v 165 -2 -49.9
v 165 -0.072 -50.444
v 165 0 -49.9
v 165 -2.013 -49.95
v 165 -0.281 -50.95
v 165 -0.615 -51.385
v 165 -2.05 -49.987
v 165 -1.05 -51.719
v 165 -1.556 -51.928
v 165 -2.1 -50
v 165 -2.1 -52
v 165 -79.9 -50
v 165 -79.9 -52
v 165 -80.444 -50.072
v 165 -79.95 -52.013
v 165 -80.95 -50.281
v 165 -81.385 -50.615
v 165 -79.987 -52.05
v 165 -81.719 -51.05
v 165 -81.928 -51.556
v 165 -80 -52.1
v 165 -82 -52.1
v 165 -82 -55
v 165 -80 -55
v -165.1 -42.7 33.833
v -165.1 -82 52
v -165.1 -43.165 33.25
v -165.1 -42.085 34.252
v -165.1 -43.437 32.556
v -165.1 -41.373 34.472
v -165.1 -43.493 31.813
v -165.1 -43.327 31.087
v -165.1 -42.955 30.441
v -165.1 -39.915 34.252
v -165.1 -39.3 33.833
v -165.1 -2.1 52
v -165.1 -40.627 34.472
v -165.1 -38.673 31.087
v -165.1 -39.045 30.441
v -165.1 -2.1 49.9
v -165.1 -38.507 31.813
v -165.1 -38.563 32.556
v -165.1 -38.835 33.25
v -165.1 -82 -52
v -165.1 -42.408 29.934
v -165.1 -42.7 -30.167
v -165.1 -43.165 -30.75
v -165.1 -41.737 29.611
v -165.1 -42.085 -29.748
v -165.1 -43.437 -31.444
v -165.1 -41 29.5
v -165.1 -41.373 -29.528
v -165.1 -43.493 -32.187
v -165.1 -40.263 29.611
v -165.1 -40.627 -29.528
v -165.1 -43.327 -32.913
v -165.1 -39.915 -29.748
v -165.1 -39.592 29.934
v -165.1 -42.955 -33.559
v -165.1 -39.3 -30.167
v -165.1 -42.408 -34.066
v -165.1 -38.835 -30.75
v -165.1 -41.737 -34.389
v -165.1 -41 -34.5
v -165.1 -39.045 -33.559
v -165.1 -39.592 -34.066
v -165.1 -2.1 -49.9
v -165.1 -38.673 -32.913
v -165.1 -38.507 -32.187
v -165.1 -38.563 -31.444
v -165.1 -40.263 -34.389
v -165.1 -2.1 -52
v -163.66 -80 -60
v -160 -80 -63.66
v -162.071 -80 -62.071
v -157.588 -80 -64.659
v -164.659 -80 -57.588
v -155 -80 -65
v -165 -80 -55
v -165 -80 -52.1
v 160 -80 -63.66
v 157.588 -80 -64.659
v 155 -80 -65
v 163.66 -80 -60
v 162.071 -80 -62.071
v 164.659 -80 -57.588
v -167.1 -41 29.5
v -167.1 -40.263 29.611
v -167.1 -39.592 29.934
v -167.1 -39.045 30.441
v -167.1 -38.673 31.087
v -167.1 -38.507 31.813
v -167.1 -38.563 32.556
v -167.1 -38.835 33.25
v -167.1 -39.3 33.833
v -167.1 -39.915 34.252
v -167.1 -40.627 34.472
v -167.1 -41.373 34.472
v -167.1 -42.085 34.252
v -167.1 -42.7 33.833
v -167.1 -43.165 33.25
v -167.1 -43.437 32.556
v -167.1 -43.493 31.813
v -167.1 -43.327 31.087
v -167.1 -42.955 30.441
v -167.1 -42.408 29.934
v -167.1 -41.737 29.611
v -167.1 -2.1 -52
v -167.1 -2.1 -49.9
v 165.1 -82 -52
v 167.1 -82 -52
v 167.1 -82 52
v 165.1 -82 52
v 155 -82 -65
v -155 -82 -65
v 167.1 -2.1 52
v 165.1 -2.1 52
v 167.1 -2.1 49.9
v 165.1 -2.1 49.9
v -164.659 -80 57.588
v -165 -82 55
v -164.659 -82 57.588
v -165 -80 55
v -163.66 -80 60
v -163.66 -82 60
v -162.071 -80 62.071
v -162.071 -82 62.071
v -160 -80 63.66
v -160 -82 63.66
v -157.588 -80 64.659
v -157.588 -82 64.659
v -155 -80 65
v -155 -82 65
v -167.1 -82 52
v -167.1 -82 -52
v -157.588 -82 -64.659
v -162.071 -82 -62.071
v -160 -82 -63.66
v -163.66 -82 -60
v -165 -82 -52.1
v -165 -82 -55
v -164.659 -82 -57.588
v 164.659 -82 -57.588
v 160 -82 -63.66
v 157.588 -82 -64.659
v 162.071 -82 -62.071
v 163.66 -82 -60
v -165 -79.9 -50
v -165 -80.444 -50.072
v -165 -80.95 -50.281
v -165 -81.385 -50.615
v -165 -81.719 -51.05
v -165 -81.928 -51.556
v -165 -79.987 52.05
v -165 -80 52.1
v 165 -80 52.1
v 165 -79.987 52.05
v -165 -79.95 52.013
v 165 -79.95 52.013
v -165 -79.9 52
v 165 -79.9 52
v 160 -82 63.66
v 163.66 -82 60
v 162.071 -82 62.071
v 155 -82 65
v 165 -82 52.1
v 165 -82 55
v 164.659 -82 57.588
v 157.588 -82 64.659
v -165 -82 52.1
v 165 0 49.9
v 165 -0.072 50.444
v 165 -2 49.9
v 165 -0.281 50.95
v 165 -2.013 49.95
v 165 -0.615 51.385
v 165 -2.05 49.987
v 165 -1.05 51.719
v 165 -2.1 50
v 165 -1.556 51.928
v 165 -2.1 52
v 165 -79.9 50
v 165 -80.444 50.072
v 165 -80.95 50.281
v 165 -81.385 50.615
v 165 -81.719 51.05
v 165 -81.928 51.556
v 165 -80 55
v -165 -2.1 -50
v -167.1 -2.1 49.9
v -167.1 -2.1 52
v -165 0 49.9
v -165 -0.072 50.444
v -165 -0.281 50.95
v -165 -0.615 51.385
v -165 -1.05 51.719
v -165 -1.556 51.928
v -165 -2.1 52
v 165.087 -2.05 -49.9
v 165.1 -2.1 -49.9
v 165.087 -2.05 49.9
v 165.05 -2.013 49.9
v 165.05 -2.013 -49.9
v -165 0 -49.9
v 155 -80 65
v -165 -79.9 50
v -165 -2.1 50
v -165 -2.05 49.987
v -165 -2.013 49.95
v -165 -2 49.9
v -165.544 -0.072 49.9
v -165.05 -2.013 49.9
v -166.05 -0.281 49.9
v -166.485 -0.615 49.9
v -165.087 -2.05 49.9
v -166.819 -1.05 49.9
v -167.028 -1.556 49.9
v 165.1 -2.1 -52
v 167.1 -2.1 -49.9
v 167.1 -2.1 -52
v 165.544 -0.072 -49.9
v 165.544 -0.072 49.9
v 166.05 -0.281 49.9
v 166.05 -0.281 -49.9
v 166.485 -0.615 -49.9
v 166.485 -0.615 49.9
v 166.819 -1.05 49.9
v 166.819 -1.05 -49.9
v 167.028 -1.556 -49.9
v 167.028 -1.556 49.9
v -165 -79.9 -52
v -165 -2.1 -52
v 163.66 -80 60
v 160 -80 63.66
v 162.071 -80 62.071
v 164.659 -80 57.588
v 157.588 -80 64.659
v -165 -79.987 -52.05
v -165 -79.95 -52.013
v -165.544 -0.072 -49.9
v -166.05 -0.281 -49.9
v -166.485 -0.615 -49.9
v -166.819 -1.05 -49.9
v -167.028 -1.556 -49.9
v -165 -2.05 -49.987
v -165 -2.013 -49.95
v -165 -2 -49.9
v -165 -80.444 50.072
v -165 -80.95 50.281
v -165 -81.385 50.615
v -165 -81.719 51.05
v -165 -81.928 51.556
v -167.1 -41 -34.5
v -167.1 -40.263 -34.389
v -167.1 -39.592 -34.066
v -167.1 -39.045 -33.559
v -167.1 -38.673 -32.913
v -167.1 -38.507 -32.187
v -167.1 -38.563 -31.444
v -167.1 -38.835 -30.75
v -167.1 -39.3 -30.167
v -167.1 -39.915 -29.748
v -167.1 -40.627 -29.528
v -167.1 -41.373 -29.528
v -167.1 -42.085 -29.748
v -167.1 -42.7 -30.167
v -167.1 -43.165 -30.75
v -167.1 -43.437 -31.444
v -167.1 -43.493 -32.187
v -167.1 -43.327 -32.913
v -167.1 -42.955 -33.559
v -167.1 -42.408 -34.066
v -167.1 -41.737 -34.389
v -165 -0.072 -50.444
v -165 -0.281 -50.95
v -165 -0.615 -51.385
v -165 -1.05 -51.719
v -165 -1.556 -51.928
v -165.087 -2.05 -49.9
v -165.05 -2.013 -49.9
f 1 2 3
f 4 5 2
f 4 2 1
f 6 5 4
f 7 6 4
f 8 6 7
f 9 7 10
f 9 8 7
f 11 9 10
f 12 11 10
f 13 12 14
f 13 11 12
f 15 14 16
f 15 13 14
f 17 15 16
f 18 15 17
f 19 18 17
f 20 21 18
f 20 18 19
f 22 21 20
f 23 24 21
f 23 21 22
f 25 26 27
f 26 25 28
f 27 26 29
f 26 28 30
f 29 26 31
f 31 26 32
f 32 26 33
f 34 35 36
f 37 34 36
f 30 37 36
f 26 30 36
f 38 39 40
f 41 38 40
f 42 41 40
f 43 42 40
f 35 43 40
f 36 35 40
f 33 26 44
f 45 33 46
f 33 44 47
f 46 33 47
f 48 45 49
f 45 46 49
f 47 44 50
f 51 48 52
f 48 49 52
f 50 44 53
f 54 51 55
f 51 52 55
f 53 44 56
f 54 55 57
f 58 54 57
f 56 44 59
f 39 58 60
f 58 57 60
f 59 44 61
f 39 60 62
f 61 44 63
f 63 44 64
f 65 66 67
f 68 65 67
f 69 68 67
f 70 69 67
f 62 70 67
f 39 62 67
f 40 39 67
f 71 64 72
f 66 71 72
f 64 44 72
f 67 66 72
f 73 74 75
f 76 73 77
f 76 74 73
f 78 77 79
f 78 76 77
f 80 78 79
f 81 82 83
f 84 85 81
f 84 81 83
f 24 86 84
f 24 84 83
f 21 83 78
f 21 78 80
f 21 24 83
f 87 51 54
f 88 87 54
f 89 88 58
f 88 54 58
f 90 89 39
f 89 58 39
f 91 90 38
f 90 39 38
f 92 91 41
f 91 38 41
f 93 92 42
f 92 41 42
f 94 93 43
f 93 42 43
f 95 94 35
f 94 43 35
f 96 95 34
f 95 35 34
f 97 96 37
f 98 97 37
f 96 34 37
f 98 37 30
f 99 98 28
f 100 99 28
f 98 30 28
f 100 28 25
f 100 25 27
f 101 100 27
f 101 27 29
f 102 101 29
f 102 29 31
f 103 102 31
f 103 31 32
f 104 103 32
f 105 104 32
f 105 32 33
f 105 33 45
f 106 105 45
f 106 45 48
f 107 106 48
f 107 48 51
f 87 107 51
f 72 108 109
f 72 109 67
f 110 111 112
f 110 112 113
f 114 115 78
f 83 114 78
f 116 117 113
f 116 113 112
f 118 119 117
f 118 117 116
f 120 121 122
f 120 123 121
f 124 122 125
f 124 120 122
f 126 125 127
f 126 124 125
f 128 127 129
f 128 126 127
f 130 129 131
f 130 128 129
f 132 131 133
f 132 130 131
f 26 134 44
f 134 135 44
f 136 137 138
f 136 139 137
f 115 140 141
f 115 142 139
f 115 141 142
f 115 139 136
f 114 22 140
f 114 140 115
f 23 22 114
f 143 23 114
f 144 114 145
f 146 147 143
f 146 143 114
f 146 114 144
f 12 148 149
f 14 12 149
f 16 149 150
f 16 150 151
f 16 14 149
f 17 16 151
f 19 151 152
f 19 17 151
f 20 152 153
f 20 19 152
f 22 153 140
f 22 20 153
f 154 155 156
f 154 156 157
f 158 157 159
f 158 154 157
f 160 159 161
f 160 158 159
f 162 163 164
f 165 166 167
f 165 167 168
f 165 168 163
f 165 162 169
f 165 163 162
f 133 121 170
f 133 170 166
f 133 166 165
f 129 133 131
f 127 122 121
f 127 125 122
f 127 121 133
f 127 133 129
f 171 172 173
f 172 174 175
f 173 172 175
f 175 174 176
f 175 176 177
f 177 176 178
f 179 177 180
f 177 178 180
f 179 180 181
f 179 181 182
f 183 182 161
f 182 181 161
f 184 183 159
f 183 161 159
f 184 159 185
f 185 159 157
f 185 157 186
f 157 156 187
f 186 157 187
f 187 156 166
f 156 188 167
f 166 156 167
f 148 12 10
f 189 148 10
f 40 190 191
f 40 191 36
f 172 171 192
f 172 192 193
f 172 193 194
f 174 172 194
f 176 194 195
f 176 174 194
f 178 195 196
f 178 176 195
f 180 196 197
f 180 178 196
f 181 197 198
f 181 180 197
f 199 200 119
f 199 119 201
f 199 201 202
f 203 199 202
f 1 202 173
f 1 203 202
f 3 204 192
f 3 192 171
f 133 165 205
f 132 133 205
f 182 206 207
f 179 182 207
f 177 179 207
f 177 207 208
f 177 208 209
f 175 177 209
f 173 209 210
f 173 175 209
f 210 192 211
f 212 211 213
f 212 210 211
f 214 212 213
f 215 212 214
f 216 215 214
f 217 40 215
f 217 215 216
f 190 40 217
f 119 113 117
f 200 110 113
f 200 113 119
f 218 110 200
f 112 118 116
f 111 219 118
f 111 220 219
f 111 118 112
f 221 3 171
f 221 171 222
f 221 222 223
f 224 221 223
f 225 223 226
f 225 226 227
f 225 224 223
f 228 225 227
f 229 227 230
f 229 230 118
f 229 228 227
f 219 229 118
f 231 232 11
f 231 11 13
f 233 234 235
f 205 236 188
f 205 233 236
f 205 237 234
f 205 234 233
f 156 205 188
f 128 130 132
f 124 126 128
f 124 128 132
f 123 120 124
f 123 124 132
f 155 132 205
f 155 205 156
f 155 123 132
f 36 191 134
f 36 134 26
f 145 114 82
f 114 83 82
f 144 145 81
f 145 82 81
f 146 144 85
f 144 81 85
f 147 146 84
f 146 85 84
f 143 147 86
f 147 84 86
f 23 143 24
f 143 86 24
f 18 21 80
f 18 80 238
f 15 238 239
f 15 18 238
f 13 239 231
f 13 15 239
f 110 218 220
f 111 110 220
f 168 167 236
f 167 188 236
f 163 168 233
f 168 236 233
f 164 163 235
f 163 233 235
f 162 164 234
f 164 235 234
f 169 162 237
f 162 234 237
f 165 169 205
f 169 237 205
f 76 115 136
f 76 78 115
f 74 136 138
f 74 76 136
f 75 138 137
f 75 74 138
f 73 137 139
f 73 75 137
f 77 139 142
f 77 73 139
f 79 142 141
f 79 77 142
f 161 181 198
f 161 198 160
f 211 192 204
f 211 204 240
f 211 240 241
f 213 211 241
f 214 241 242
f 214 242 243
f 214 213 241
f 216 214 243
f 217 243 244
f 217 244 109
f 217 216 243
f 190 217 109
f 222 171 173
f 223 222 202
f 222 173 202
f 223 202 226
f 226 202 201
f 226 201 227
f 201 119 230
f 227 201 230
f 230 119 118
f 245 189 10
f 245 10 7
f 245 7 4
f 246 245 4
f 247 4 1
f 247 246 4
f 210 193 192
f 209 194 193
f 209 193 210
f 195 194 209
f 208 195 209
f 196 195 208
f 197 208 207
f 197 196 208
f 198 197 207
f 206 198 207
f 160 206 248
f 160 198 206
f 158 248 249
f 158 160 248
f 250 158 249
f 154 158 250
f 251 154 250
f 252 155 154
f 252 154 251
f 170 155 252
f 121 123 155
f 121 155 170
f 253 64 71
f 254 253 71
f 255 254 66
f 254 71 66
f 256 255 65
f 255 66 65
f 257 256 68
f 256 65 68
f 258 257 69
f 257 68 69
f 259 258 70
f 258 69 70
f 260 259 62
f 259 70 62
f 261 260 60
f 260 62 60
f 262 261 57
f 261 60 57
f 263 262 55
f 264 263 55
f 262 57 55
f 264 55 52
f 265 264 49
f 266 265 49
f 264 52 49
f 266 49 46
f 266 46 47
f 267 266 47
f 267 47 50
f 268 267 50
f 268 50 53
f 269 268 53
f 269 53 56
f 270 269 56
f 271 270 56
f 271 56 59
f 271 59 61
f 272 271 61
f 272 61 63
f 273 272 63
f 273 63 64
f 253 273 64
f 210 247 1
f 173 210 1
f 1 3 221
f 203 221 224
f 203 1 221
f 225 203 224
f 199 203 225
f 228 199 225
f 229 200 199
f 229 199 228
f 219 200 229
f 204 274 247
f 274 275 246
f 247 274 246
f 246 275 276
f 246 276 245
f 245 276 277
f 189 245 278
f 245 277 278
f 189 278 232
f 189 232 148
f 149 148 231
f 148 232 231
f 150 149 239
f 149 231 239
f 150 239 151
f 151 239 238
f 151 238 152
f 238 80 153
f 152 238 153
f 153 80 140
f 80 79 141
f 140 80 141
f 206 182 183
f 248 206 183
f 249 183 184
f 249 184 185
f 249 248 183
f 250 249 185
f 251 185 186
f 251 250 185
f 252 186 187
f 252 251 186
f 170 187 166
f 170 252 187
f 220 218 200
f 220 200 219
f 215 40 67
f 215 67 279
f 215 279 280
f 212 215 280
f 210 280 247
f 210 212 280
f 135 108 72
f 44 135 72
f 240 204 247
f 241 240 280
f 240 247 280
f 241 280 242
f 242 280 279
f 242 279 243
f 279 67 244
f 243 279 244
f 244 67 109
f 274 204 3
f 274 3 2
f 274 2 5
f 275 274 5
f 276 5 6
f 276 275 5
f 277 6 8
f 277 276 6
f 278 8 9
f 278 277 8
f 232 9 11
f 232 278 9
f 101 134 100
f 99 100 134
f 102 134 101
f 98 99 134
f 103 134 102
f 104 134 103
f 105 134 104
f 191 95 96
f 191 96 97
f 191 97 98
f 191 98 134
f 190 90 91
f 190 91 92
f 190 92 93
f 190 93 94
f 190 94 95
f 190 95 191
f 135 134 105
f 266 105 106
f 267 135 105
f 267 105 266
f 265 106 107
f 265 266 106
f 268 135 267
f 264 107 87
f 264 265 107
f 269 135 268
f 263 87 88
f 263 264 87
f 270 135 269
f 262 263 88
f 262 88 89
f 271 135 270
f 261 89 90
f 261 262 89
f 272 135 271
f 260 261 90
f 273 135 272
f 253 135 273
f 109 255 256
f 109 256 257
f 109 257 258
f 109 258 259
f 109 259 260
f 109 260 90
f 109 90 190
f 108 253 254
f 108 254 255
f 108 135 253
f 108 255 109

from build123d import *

# Parameters (mm, degrees)
SKIZZE3_W                          = 330
SKIZZE3_H                          = 100
BASIS_BLECH1_DEPTH                 = 2
KANTE_LASCHE1_STRIP_W              = 8.2
KANTE_LASCHE1_STRIP_H              = 2
KANTE_LASCHE1_STRIP_CUT_DEPTH      = 330
KANTE_LASCHE1_STRIP_2_W            = 8.2
KANTE_LASCHE1_STRIP_2_H            = 2
KANTE_LASCHE1_STRIP_CUT_2_DEPTH    = 330
KANTE_LASCHE1_DEPTH                = 330
KANTE_LASCHE1_BEND_DEPTH           = 330
KANTE_LASCHE5_DEPTH                = 99.8
KANTE_LASCHE5_BEND_DEPTH           = 99.8
KANTE_LASCHE3_STRIP_W              = 8.2
KANTE_LASCHE3_STRIP_H              = 2
KANTE_LASCHE3_STRIP_CUT_DEPTH      = 330
KANTE_LASCHE3_STRIP_2_W            = 8.2
KANTE_LASCHE3_STRIP_2_H            = 2
KANTE_LASCHE3_STRIP_CUT_2_DEPTH    = 330
KANTE_LASCHE3_DEPTH                = 330
KANTE_LASCHE3_BEND_DEPTH           = 330
VERRUNDUNG2_R                      = 10
F_5_0_5_DURCHMESSER_BOHRUNG1_D     = 5
F_5_0_5_DURCHMESSER_BOHRUNG1_DEPTH = 10
F_5_0_5_DURCHMESSER_BOHRUNG1_TIP   = 1.502151548
GESCHLOSSENE_START                 = -52
GESCHLOSSENE_ECKE2_OUTLINE_W       = 2
GESCHLOSSENE_ECKE2_OUTLINE_H       = 79.9
GESCHLOSSENE_ECKE2_DEPTH           = 2.1
GESCHLOSSENE_START_2               = 49.9
GESCHLOSSENE_ECKE2_2_OUTLINE_W     = 2
GESCHLOSSENE_ECKE2_2_OUTLINE_H     = 79.9
GESCHLOSSENE_ECKE2_2_DEPTH         = 2.1


# Read off the part's stored shape, not the designer's step: Geschlossene Ecke2
# Sheet-metal steps are written as plain solids
with BuildPart() as part:
    # Skizze3 → Basis-Blech1 (new body)
    with BuildSketch(Plane(origin=(0, 0, 0), x_dir=(1, 0, 0), z_dir=(0, 1, 0))):
        Rectangle(SKIZZE3_W, SKIZZE3_H)
    extrude(amount=-BASIS_BLECH1_DEPTH)

    # Kante-Lasche1 strip (across the edge) → Kante-Lasche1 strip cut (cut)
    with BuildSketch(Plane(origin=(-165, -2, -50), x_dir=(0, 0, 1), z_dir=(1, 0, 0))):
        with Locations((-4, -1)):
            Rectangle(KANTE_LASCHE1_STRIP_W, KANTE_LASCHE1_STRIP_H)
    extrude(amount=KANTE_LASCHE1_STRIP_CUT_DEPTH, mode=Mode.SUBTRACT)

    # Kante-Lasche1 strip 2 (across the edge) → Kante-Lasche1 strip cut 2 (cut)
    with BuildSketch(Plane(origin=(165, -2, 50), x_dir=(0, 0, -1), z_dir=(-1, 0, 0))):
        with Locations((-4, -1)):
            Rectangle(KANTE_LASCHE1_STRIP_2_W, KANTE_LASCHE1_STRIP_2_H)
    extrude(amount=KANTE_LASCHE1_STRIP_CUT_2_DEPTH, mode=Mode.SUBTRACT)

    # Kante-Lasche1 section (across the edge) → Kante-Lasche1 (add)
    with BuildSketch(Plane(origin=(-165, -2, -50), x_dir=(0, 0, 1), z_dir=(1, 0, 0))):
        with BuildLine():
            Line((-2, 0.1), (-2, 80))
            Line((-2, 80), (0, 80))
            Line((0, 80), (0, 0.1))
            ThreePointArc((0, 0.1), (0.029289322, 0.029289322), (0.1, 0))
            Line((0.1, 0), (0.1, -2))
            ThreePointArc((0.1, -2), (-1.38492424, -1.38492424), (-2, 0.1))
        make_face()
    extrude(amount=KANTE_LASCHE1_DEPTH)

    # Kante-Lasche1 section 2 (across the edge) → Kante-Lasche1 bend (add)
    with BuildSketch(Plane(origin=(165, -2, 50), x_dir=(0, 0, -1), z_dir=(-1, 0, 0))):
        with BuildLine():
            Line((-2, 0.1), (-2, 80))
            Line((-2, 80), (0, 80))
            Line((0, 80), (0, 0.1))
            ThreePointArc((0, 0.1), (0.029289322, 0.029289322), (0.1, 0))
            Line((0.1, 0), (0.1, -2))
            ThreePointArc((0.1, -2), (-1.38492424, -1.38492424), (-2, 0.1))
        make_face()
    extrude(amount=KANTE_LASCHE1_BEND_DEPTH)

    # Kante-Lasche5 section (across the edge) → Kante-Lasche5 (add)
    with BuildSketch(Plane(origin=(-165.1, -2, 49.9), x_dir=(1, 0, 0), z_dir=(0, 0, -1))):
        with BuildLine():
            Line((-2, 0.1), (-2, 80))
            Line((-2, 80), (0, 80))
            Line((0, 80), (0, 0.1))
            ThreePointArc((0, 0.1), (0.029289322, 0.029289322), (0.1, 0))
            Line((0.1, 0), (0.1, -2))
            ThreePointArc((0.1, -2), (-1.38492424, -1.38492424), (-2, 0.1))
        make_face()
    extrude(amount=KANTE_LASCHE5_DEPTH)

    # Kante-Lasche5 section 2 (across the edge) → Kante-Lasche5 bend (add)
    with BuildSketch(Plane(origin=(165.1, -2, -49.9), x_dir=(-1, 0, 0), z_dir=(0, 0, 1))):
        with BuildLine():
            Line((-2, 0.1), (-2, 80))
            Line((-2, 80), (0, 80))
            Line((0, 80), (0, 0.1))
            ThreePointArc((0, 0.1), (0.029289322, 0.029289322), (0.1, 0))
            Line((0.1, 0), (0.1, -2))
            ThreePointArc((0.1, -2), (-1.38492424, -1.38492424), (-2, 0.1))
        make_face()
    extrude(amount=KANTE_LASCHE5_BEND_DEPTH)

    # Kante-Lasche3 strip (across the edge) → Kante-Lasche3 strip cut (cut)
    with BuildSketch(Plane(origin=(-165, -82, 52), x_dir=(0, 1, 0), z_dir=(1, 0, 0))):
        with Locations((-2, -1)):
            Rectangle(KANTE_LASCHE3_STRIP_W, KANTE_LASCHE3_STRIP_H)
    extrude(amount=KANTE_LASCHE3_STRIP_CUT_DEPTH, mode=Mode.SUBTRACT)

    # Kante-Lasche3 strip 2 (across the edge) → Kante-Lasche3 strip cut 2 (cut)
    with BuildSketch(Plane(origin=(165, -82, -52), x_dir=(0, 1, 0), z_dir=(-1, 0, 0))):
        with Locations((-2, -1)):
            Rectangle(KANTE_LASCHE3_STRIP_2_W, KANTE_LASCHE3_STRIP_2_H)
    extrude(amount=KANTE_LASCHE3_STRIP_CUT_2_DEPTH, mode=Mode.SUBTRACT)

    # Kante-Lasche3 section (across the edge) → Kante-Lasche3 (add)
    with BuildSketch(Plane(origin=(-165, -82, 52), x_dir=(0, 1, 0), z_dir=(1, 0, 0))):
        with BuildLine():
            Line((0, 0.1), (0, 13))
            Line((0, 13), (2, 13))
            Line((2, 13), (2, 0.1))
            ThreePointArc((2, 0.1), (2.029289322, 0.029289322), (2.1, 0))
            Line((2.1, 0), (2.1, -2))
            ThreePointArc((2.1, -2), (0.61507576, -1.38492424), (0, 0.1))
        make_face()
    extrude(amount=KANTE_LASCHE3_DEPTH)

    # Kante-Lasche3 section 2 (across the edge) → Kante-Lasche3 bend (add)
    with BuildSketch(Plane(origin=(165, -82, -52), x_dir=(0, 1, 0), z_dir=(-1, 0, 0))):
        with BuildLine():
            Line((0, 0.1), (0, 13))
            Line((0, 13), (2, 13))
            Line((2, 13), (2, 0.1))
            ThreePointArc((2, 0.1), (2.029289322, 0.029289322), (2.1, 0))
            Line((2.1, 0), (2.1, -2))
            ThreePointArc((2.1, -2), (0.61507576, -1.38492424), (0, 0.1))
        make_face()
    extrude(amount=KANTE_LASCHE3_BEND_DEPTH)

    # Verrundung2
    verrundung2_edges = [part.edges().sort_by_distance(p)[0] for p in [
        (-165, -81, 65),
        (165, -81, 65),
        (165, -81, -65),
        (-165, -81, -65),
    ]]
    fillet(verrundung2_edges, radius=VERRUNDUNG2_R)

    # Ø5.0 (5) Durchmesser Bohrung1
    with Locations(Plane.ZY.offset(167.1)):
        with Locations((32, -41), (-32, -41)):
            Hole(F_5_0_5_DURCHMESSER_BOHRUNG1_D / 2, depth=F_5_0_5_DURCHMESSER_BOHRUNG1_DEPTH)
            with Locations((0, 0, -(F_5_0_5_DURCHMESSER_BOHRUNG1_DEPTH + F_5_0_5_DURCHMESSER_BOHRUNG1_TIP / 2))):  # 118° drill point
                Cone(0, F_5_0_5_DURCHMESSER_BOHRUNG1_D / 2, F_5_0_5_DURCHMESSER_BOHRUNG1_TIP, mode=Mode.SUBTRACT)

    # Geschlossene Ecke2 outline → Geschlossene Ecke2 (add)
    with BuildSketch(Plane.XY.offset(GESCHLOSSENE_START)):
        with Locations((-166.1, -42.05)):
            Rectangle(GESCHLOSSENE_ECKE2_OUTLINE_W, GESCHLOSSENE_ECKE2_OUTLINE_H)
        with Locations((166.1, -42.05)):
            Rectangle(GESCHLOSSENE_ECKE2_OUTLINE_W, GESCHLOSSENE_ECKE2_OUTLINE_H)
    extrude(amount=GESCHLOSSENE_ECKE2_DEPTH)

    # Geschlossene Ecke2 2 outline → Geschlossene Ecke2 2 (add)
    with BuildSketch(Plane.XY.offset(GESCHLOSSENE_START_2)):
        with Locations((-166.1, -42.05)):
            Rectangle(GESCHLOSSENE_ECKE2_2_OUTLINE_W, GESCHLOSSENE_ECKE2_2_OUTLINE_H)
        with Locations((166.1, -42.05)):
            Rectangle(GESCHLOSSENE_ECKE2_2_OUTLINE_W, GESCHLOSSENE_ECKE2_2_OUTLINE_H)
    extrude(amount=GESCHLOSSENE_ECKE2_2_DEPTH)


solid = part.part
